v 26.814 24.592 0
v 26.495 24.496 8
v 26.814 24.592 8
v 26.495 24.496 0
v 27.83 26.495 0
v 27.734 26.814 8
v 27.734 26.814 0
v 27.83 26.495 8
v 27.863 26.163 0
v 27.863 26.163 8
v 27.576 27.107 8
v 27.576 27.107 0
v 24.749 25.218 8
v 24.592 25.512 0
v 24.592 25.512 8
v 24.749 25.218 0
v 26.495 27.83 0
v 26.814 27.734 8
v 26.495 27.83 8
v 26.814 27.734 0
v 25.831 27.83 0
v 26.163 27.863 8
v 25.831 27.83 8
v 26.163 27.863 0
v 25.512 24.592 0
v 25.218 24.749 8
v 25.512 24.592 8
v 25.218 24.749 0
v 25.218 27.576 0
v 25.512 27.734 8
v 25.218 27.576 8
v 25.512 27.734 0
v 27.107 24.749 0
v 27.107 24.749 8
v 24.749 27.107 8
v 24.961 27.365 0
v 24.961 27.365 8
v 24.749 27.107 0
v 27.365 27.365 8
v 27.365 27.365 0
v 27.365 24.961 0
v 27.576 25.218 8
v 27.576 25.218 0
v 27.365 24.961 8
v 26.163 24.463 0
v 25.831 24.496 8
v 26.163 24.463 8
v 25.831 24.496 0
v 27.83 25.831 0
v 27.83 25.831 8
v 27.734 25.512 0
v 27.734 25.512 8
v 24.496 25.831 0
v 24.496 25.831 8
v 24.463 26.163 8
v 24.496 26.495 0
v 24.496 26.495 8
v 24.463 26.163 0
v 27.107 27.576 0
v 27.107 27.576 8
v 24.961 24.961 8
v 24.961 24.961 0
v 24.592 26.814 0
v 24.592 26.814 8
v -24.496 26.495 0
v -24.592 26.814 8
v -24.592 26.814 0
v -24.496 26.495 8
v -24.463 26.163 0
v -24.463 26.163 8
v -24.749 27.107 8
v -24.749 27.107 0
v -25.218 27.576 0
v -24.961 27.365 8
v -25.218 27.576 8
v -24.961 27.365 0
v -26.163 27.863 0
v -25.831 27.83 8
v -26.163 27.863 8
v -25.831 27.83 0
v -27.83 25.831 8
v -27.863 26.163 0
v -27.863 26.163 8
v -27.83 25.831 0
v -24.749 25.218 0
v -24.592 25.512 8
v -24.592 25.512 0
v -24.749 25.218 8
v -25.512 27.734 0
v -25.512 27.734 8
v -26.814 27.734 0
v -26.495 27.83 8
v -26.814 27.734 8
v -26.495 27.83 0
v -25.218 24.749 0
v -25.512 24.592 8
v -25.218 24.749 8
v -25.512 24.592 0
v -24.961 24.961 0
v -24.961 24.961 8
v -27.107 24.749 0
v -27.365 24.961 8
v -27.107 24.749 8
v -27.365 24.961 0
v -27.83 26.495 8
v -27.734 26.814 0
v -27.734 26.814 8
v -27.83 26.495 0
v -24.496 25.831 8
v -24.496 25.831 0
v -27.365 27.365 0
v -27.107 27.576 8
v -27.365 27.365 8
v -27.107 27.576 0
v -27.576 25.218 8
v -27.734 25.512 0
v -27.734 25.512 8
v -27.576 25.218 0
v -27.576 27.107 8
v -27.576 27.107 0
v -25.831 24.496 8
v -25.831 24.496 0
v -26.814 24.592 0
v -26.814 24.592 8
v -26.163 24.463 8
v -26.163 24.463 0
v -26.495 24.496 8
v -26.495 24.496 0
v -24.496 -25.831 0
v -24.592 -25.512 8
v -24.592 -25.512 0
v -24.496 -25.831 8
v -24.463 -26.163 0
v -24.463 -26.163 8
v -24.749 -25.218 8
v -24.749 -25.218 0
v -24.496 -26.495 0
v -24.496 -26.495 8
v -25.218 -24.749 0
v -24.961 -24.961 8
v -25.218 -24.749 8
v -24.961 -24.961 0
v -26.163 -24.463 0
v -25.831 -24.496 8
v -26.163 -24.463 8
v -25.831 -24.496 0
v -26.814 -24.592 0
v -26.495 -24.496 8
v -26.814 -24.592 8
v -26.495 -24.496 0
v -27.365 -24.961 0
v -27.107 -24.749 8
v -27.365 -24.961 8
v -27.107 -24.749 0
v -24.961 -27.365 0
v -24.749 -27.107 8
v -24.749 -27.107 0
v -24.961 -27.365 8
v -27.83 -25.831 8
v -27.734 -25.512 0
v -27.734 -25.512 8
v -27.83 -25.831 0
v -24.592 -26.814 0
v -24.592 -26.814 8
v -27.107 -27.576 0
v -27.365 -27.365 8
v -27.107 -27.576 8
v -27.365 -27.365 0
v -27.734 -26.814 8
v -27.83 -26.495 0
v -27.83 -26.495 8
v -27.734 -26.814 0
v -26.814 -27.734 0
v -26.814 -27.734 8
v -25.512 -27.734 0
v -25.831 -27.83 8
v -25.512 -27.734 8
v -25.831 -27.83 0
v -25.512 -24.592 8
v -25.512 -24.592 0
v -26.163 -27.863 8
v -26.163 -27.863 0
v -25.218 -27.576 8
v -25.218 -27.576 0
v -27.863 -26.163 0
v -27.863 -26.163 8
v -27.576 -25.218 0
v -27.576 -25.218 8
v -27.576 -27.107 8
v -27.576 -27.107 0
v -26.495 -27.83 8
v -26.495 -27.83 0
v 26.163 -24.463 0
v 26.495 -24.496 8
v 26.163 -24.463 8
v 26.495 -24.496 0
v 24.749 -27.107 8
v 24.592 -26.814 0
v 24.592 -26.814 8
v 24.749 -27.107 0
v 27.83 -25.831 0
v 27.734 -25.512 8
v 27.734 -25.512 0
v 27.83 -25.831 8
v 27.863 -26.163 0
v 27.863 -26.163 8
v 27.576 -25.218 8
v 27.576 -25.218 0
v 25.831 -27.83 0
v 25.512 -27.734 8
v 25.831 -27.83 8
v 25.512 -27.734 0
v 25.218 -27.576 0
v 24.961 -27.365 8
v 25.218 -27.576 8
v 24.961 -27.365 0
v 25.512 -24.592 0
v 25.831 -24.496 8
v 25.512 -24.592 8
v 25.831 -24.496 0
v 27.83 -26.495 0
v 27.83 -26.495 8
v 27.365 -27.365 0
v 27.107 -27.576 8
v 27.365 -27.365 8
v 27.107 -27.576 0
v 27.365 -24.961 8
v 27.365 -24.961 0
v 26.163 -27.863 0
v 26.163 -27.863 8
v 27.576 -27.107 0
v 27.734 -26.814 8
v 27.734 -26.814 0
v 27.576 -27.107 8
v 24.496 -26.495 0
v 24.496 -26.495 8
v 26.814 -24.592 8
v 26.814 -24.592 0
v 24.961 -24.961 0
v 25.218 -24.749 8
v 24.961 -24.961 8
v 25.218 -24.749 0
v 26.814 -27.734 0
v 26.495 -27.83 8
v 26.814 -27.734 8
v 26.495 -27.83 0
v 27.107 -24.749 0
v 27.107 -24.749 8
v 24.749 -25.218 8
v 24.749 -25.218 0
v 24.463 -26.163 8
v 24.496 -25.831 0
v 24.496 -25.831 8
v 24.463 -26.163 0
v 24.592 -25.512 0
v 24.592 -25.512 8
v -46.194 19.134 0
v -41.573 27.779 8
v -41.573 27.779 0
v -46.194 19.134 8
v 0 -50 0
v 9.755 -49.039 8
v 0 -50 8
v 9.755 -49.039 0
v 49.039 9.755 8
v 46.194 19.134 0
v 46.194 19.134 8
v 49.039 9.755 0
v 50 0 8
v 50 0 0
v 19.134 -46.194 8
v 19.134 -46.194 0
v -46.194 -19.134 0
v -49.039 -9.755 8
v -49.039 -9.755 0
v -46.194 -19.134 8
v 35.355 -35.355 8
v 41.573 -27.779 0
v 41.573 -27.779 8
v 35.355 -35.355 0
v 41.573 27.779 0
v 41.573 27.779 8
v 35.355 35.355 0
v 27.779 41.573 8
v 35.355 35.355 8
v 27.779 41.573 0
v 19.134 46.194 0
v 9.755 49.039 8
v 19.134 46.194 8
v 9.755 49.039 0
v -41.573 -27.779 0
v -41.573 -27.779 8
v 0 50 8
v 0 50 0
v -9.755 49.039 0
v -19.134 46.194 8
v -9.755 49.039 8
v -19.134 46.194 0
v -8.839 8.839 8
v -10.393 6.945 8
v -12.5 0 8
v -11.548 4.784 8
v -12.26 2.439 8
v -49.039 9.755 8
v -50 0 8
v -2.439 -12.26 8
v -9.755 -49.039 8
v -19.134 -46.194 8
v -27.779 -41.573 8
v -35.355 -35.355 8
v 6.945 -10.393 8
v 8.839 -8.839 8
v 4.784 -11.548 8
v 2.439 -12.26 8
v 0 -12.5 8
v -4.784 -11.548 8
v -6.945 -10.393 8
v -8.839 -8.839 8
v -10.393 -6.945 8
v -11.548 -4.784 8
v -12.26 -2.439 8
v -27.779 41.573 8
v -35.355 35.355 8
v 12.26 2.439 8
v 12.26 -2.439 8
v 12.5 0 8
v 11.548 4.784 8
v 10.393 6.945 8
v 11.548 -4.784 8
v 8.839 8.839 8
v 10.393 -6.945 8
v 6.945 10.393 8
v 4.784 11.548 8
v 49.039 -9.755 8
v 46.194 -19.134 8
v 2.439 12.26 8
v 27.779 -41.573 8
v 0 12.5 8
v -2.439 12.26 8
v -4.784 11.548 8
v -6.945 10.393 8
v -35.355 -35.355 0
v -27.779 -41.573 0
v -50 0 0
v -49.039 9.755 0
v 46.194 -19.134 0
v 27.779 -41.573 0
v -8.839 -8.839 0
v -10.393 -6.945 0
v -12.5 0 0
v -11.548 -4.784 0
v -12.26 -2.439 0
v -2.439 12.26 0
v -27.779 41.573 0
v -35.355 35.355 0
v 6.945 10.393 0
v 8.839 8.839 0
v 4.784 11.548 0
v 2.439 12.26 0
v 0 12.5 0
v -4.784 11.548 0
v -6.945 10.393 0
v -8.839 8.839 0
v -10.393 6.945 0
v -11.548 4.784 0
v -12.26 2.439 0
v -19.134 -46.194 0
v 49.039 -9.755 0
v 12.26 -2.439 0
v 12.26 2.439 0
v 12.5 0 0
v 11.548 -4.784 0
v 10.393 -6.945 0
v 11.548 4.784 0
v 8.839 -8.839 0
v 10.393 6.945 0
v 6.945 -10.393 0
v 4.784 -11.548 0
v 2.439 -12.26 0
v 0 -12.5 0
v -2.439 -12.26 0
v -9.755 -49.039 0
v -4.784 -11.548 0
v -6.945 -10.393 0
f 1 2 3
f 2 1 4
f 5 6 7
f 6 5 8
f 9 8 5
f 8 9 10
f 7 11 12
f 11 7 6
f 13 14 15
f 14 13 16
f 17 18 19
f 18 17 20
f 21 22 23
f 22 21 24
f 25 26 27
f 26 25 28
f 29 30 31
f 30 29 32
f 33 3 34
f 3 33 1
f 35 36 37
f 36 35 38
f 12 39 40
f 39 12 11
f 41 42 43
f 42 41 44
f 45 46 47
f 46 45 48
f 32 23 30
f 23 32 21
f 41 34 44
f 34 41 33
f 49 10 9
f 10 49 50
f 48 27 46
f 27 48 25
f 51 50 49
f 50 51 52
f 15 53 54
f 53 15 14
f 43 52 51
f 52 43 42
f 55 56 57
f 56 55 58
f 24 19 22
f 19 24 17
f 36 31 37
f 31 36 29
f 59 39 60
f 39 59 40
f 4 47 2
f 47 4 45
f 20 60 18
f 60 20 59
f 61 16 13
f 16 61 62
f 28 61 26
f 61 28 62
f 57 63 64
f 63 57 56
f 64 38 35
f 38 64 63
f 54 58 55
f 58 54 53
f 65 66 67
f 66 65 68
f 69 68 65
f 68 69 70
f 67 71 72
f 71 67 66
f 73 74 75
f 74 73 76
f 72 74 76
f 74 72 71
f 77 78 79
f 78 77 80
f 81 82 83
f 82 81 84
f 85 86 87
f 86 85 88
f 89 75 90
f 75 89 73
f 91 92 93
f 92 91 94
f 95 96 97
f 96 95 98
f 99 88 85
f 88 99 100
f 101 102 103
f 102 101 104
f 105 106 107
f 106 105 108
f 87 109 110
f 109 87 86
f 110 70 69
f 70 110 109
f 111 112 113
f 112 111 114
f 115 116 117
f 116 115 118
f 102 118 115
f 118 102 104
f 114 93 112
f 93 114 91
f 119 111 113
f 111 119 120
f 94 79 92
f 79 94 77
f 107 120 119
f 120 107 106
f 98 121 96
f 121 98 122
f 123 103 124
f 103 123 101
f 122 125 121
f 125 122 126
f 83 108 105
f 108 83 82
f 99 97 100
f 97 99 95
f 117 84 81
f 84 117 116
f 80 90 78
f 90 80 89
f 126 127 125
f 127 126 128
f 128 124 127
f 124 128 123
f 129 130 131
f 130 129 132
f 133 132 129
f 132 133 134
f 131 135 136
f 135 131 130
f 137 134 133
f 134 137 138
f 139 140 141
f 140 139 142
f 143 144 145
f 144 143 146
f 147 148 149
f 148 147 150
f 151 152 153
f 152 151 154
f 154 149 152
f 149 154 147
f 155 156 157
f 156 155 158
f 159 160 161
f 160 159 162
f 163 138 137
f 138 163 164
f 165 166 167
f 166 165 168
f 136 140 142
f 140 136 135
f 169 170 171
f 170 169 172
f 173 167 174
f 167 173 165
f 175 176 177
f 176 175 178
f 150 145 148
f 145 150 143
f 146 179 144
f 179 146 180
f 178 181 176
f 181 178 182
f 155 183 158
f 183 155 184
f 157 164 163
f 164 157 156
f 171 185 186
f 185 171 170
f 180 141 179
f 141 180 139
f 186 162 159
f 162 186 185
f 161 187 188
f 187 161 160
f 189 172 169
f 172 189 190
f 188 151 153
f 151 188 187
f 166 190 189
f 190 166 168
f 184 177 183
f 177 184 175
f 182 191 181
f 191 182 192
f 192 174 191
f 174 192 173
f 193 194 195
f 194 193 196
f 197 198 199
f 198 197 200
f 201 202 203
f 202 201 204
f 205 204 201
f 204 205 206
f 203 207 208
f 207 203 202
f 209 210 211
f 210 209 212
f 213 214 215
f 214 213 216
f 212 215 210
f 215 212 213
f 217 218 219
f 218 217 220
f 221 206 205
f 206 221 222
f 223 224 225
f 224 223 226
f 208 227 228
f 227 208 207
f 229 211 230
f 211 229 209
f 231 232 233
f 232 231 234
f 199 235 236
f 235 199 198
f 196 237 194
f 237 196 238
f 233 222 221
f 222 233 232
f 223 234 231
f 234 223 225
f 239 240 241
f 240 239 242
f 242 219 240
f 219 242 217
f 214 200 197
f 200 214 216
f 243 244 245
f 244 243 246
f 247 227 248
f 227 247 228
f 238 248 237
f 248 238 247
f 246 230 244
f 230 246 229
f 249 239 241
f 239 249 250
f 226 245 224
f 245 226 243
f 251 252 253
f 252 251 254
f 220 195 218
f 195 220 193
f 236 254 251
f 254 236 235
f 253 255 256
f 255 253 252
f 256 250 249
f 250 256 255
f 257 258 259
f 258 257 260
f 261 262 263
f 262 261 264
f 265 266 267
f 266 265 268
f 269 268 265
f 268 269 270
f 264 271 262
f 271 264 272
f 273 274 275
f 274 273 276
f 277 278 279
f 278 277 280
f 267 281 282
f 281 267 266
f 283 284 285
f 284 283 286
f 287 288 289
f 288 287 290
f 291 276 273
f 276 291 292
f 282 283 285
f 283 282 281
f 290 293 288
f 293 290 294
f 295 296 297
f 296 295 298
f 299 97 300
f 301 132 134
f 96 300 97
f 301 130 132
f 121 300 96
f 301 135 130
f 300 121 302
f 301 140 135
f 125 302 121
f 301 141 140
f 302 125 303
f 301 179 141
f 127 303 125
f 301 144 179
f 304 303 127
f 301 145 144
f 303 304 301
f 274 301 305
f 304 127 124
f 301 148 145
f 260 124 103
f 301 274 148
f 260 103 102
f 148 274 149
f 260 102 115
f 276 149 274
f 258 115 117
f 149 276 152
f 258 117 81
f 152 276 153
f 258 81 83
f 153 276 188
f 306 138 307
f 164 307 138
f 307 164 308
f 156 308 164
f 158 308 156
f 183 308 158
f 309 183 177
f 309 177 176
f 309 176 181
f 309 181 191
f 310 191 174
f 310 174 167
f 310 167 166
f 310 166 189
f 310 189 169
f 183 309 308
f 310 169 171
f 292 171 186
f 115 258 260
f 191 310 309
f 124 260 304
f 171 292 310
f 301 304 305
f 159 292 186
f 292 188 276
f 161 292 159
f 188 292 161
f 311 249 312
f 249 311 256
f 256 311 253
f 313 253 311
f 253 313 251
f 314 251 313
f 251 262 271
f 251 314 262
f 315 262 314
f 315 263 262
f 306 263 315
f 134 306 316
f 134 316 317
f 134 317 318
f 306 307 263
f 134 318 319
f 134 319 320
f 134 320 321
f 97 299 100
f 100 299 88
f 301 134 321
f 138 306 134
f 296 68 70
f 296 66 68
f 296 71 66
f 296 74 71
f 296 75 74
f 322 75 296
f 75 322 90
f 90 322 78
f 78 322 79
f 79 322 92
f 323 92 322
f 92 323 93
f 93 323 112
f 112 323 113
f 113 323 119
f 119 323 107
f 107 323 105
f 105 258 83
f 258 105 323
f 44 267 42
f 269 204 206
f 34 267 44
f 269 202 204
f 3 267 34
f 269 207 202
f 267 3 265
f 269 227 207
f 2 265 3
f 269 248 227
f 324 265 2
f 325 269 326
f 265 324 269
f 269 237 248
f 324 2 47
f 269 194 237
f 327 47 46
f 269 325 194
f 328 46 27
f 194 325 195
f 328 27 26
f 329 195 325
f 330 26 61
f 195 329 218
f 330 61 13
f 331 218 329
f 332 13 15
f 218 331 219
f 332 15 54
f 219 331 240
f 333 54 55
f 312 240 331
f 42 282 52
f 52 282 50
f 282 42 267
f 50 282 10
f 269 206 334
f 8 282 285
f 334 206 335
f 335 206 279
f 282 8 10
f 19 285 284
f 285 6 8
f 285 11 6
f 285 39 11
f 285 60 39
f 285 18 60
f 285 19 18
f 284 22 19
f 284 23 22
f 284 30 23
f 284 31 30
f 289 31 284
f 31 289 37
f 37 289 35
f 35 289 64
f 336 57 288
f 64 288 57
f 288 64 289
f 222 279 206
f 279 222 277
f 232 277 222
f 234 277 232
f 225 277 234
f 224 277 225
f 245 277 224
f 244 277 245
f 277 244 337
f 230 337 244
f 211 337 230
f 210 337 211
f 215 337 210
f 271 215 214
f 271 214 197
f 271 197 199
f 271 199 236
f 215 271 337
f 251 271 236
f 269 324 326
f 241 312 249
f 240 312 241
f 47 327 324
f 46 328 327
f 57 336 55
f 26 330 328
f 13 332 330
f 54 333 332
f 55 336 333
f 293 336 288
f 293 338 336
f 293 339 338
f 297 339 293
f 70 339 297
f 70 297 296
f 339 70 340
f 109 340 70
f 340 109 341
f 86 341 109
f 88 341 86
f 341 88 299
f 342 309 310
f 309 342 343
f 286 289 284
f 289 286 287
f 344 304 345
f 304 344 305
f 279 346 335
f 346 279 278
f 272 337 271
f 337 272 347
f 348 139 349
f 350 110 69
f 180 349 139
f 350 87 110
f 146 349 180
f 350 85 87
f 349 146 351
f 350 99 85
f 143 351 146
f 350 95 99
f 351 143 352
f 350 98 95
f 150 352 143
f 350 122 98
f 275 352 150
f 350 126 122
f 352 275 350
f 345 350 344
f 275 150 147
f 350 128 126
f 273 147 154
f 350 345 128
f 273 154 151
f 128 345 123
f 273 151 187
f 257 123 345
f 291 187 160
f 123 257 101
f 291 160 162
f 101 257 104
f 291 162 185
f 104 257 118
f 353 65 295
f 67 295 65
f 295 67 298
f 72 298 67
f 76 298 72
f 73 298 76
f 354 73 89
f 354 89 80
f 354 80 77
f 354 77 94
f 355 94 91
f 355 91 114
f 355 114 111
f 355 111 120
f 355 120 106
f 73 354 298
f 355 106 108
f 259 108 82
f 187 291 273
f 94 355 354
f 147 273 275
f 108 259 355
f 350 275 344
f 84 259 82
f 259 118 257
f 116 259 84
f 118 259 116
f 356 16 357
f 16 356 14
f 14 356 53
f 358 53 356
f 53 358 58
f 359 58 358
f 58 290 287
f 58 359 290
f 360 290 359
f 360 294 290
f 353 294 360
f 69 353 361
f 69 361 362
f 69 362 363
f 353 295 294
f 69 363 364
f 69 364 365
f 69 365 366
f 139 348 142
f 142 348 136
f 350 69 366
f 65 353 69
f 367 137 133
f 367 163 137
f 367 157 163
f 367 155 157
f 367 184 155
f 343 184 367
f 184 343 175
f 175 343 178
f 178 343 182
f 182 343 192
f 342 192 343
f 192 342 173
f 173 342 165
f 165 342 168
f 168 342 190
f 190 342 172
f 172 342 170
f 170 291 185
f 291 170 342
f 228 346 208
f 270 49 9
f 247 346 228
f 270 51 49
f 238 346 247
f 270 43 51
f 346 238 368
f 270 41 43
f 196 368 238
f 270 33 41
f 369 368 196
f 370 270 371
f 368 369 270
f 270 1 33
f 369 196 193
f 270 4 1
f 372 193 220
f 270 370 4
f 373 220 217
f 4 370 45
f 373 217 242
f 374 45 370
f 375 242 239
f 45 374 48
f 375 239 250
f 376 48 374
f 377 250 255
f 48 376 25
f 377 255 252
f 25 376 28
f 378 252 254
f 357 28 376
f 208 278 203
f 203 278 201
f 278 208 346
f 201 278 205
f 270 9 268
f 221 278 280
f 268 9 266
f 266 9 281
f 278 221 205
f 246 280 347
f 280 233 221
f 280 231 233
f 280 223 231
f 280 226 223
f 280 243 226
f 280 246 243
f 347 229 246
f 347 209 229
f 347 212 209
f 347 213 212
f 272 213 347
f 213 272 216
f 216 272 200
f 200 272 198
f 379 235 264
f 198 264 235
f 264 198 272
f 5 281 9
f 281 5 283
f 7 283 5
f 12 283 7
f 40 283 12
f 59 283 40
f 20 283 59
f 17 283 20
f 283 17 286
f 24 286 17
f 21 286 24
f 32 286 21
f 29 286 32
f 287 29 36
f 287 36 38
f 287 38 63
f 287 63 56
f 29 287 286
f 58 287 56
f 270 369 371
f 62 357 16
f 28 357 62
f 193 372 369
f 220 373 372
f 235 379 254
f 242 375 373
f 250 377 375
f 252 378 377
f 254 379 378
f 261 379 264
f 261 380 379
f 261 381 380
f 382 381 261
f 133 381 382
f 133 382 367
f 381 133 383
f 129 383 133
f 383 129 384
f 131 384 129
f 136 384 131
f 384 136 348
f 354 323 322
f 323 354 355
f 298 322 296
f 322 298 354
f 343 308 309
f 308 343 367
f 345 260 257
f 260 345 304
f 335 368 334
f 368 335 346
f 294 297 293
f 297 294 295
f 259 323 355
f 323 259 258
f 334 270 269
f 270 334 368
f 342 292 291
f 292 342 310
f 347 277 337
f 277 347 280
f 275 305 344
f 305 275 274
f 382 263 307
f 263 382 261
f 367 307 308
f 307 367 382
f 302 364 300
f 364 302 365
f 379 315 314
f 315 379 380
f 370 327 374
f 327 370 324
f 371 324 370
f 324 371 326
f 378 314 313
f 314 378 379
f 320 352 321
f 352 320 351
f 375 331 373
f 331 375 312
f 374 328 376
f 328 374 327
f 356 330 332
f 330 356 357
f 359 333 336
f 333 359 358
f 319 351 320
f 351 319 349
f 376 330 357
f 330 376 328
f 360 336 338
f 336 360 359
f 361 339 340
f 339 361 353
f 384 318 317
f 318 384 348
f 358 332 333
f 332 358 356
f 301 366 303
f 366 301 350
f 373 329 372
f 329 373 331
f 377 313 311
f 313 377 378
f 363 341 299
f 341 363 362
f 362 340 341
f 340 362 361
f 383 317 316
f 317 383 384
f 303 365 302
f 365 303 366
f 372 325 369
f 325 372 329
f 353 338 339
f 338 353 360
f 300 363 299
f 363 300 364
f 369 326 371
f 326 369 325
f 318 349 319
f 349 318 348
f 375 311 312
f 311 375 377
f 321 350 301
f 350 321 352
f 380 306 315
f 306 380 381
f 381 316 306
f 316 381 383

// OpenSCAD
$fn = 32;

// ----------------------------------------------------------------------
// Flange Ø100 x 8
// 4 holes on a Ø74 bolt circle, bolted joints
// ----------------------------------------------------------------------

// --- parameters (mm) ---
flange_d = 100;  // outside diameter of the flange
thickness = 8;   // flange thickness
holes = 4;       // number of bolt holes
pcd = 74;        // bolt circle diameter
start_deg = 45;  // angle of the first hole, from +X
hole_d = 3.4;    // bolt hole diameter
bore_d = 25;     // central through bore
hub_d = 37;      // hub outside diameter
hub_h = 0;       // hub height above the flange face (0 = no hub)

// --- derived feature positions (mm) ---
height = thickness + hub_h;  // = 8   overall height of the part
pcd_r = pcd / 2;             // = 37   bolt circle radius
hole_step = 360 / holes;     // = 90   angular pitch
feature_centers = [
  [pcd_r * cos(start_deg + 0 * hole_step), pcd_r * sin(start_deg + 0 * hole_step)],
  [pcd_r * cos(start_deg + 1 * hole_step), pcd_r * sin(start_deg + 1 * hole_step)],
  [pcd_r * cos(start_deg + 2 * hole_step), pcd_r * sin(start_deg + 2 * hole_step)],
  [pcd_r * cos(start_deg + 3 * hole_step), pcd_r * sin(start_deg + 3 * hole_step)]
];   // bolt hole centres on the pitch circle

// flange disc, every hole and the bore cut straight through
difference() {
  union() {
    cylinder(d = flange_d, h = thickness);
  }
  translate([0, 0, -1]) cylinder(d = bore_d, h = height + 2);  // bore, through
  for (centre = feature_centers)
    translate([centre[0], centre[1], -1]) cylinder(d = hole_d, h = thickness + 2);
}
